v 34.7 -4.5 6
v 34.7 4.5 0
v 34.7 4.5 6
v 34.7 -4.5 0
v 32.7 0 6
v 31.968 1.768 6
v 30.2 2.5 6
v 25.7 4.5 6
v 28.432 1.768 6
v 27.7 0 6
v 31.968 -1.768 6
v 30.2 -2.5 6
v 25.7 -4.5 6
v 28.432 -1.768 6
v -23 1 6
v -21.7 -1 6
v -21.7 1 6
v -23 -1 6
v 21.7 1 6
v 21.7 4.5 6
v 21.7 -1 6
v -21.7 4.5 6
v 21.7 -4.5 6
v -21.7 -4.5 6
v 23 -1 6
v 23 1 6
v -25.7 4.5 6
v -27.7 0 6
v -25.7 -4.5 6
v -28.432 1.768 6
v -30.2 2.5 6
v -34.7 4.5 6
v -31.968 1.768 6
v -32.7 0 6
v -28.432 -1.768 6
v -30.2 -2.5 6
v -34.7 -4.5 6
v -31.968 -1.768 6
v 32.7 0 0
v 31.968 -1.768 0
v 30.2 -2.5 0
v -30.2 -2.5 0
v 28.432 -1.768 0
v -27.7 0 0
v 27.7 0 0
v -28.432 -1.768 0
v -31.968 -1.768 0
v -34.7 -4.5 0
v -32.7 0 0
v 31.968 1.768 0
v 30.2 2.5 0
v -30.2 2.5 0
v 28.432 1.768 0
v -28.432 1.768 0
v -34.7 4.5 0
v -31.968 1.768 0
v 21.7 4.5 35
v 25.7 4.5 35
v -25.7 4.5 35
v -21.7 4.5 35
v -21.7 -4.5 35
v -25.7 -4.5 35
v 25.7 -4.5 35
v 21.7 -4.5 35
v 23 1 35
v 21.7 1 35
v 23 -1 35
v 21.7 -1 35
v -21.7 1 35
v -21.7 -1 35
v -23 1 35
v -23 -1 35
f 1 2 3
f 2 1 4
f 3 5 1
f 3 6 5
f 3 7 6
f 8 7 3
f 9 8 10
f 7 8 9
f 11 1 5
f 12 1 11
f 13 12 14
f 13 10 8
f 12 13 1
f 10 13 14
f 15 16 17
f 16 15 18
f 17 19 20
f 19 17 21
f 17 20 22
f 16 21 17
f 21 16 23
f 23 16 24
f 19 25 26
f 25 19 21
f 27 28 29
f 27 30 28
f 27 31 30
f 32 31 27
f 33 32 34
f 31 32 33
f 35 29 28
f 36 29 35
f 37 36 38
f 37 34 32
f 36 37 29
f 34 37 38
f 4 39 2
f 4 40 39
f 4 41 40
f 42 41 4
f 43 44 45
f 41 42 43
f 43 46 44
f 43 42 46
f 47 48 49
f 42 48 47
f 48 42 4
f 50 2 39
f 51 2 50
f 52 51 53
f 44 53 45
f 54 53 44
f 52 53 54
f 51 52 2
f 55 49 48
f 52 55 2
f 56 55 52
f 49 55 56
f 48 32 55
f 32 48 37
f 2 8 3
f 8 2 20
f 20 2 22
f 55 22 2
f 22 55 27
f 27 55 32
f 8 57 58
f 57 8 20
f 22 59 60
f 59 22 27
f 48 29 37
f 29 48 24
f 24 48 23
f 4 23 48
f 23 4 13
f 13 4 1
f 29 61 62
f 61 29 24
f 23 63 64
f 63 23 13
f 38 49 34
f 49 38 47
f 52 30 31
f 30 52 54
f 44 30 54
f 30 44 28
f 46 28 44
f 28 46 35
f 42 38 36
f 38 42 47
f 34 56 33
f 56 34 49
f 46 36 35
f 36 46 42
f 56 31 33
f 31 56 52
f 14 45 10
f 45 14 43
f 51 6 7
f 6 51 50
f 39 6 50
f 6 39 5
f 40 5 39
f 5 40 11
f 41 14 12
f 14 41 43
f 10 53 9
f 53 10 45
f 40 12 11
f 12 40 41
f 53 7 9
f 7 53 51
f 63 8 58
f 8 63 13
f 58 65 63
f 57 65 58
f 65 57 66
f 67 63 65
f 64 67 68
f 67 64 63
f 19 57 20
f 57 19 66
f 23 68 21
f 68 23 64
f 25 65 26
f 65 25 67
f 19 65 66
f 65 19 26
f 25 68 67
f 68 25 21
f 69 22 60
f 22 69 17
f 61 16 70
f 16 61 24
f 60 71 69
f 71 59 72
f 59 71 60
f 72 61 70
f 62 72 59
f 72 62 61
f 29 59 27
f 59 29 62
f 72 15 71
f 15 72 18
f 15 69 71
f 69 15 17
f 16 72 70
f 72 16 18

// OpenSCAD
baseX = 69.4;
baseY = 9.0;
baseZ = 6.0;

postX = 4.0;
postY = baseY;
postZ = 29.0;

notchX = 1.3;
notchY = 2.0;
notchZ = postZ;

postSeparationX = 46.0 - (2 * notchX);
holeRadius = 2.5;
holeSeparationX = 60.4;

/*
 * The base with the screw holes.
 */
difference() {
	translate([-baseX / 2.0, -baseY / 2.0, 0.0])
	cube( size = [baseX, baseY, baseZ]);

	translate([-holeSeparationX / 2.0, 0.0, 0.0])
	cylinder(h = baseZ, r = holeRadius);

	translate([holeSeparationX / 2.0, 0.0, 0.0])
	cylinder(h = baseZ, r = holeRadius);
}

/*
 * The right post with notch.
 */
difference() {
	translate([postSeparationX / 2.0, -postY / 2.0, baseZ])
	cube(size = [postX, postY, postZ]);

	translate([postSeparationX /2.0, -notchY / 2.0, baseZ])
	cube(size = [notchX, notchY, notchZ]);
}

/*
 * The left post with notch.
 */
difference() {
	translate([-postSeparationX / 2.0 - postX, -postY / 2.0, baseZ])
	cube(size = [postX, postY, postZ]);

	translate([-postSeparationX / 2.0 - notchX, -notchY / 2.0, baseZ])
	cube(size = [notchX, notchY, notchZ]);
}
